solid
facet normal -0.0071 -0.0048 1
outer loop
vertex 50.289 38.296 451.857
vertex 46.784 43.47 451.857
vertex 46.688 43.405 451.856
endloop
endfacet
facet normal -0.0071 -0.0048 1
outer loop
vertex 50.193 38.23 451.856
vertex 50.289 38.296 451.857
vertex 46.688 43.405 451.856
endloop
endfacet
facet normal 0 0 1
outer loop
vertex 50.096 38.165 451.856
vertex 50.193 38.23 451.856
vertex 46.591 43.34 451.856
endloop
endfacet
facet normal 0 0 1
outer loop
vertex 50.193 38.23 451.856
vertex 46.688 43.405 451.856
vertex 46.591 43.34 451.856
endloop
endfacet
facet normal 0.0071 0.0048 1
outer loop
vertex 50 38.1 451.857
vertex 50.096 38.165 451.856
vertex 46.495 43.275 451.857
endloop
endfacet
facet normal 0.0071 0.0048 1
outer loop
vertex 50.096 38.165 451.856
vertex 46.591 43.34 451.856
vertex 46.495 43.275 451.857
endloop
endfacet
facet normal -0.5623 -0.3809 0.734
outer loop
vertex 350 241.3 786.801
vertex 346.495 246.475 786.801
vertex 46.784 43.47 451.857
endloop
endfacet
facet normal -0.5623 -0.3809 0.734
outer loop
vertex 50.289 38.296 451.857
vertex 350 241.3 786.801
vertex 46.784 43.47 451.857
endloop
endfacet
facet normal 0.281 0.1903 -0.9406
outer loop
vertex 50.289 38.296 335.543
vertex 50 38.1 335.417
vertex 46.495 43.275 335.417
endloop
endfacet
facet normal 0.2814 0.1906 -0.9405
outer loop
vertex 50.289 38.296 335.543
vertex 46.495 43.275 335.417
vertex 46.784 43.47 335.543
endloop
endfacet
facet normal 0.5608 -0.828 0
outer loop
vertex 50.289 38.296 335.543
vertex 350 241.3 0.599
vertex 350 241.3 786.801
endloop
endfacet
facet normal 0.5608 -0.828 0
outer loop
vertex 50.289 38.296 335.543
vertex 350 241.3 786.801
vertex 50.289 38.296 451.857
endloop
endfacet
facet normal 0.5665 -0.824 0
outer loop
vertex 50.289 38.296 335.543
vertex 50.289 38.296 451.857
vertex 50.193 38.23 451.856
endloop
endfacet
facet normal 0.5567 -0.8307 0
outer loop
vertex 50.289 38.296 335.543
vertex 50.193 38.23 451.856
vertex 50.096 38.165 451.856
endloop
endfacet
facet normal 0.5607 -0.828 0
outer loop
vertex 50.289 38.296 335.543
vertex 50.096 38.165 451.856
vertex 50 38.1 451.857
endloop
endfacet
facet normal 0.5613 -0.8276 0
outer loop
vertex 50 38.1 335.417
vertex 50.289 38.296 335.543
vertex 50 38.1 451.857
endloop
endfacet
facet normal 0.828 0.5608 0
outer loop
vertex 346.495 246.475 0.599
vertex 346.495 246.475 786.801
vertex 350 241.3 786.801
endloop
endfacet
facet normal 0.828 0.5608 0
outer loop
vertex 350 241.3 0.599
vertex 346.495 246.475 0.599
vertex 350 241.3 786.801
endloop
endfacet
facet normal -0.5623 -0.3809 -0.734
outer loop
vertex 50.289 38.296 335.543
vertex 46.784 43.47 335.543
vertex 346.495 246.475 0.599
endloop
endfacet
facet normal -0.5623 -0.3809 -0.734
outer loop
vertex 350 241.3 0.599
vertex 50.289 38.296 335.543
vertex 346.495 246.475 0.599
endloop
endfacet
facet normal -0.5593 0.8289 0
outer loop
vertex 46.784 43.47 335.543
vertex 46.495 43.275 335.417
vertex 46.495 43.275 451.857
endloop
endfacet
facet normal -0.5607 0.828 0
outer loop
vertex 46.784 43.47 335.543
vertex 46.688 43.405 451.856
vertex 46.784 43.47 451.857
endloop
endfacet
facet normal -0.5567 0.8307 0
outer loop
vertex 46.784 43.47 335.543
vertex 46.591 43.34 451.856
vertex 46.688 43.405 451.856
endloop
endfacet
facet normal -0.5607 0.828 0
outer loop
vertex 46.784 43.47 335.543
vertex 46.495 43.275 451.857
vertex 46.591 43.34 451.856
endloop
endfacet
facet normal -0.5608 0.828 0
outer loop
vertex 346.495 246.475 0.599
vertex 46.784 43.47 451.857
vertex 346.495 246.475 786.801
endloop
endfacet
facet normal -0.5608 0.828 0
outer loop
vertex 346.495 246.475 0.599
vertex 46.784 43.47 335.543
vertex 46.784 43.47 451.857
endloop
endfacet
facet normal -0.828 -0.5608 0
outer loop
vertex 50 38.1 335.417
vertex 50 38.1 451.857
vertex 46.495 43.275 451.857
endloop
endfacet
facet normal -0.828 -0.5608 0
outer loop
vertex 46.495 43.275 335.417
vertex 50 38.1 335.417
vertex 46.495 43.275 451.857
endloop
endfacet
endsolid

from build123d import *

# Parameters (mm, degrees)
BOSS_EXTRUDE1_DEPTH = 787.4
CAVITY1_START       = 209.393974514
CAVITY1_DEPTH       = 6.25
CUT_EXTRUDE1_DEPTH  = 897.209643935


# Read off the part's stored shape, not the designer's step: Cavity1
with BuildPart() as part:
    # Sketch1 → Boss-Extrude1 (new body)
    with BuildSketch(Plane.XY):
        Polygon((50, 38.1), (46.495004217, 43.274698499), (346.495004217, 246.474698499), (350, 241.3), align=None)
    extrude(amount=BOSS_EXTRUDE1_DEPTH)

    # Cavity1 outline → Cavity1 (cut)
    with BuildSketch(Plane(origin=(0, 0, 0), x_dir=(0.9998289109489032, -0.015681339287170415, -0.009810424501047896), z_dir=(0.018497265493313195, 0.8476202272914186, 0.5302808703467569)).offset(CAVITY1_START)):
        Polygon((42.517859439, -261.403351104), (42.802335744, -261.406643092), (342.564789453, 130.215073828), (188.320866524, 132), (41, 132), (41, -261.385786284), align=None)
    extrude(amount=CAVITY1_DEPTH, mode=Mode.SUBTRACT)

    # Sketch2 → Cut-Extrude1 (cut, through all)
    with BuildSketch(Plane(origin=(-5.470595054, 8.076665927, 0), x_dir=(0.8279517598753687, 0.5607993253555854, 0), z_dir=(-0.5607993253555854, 0.8279517598753687, 0))):
        Polygon((63.112893973, -335.543438937), (425.103993165, -0.59935118), (425.103993165, 0), (62.76404229, 0), (62.76404229, -335.417163823), align=None)
        with BuildLine():
            Line((425.103993165, -787.4), (425.103993165, -786.80064882))
            Line((425.103993165, -786.80064882), (63.112893973, -451.856561063))
            ThreePointArc((63.112893973, -451.856561063), (62.938468131, -451.856470391), (62.76404229, -451.856561063))
            Line((62.76404229, -451.856561063), (62.76404229, -787.4))
            Line((62.76404229, -787.4), (425.103993165, -787.4))
        make_face()
    extrude(amount=-CUT_EXTRUDE1_DEPTH, mode=Mode.SUBTRACT)


solid = part.part
